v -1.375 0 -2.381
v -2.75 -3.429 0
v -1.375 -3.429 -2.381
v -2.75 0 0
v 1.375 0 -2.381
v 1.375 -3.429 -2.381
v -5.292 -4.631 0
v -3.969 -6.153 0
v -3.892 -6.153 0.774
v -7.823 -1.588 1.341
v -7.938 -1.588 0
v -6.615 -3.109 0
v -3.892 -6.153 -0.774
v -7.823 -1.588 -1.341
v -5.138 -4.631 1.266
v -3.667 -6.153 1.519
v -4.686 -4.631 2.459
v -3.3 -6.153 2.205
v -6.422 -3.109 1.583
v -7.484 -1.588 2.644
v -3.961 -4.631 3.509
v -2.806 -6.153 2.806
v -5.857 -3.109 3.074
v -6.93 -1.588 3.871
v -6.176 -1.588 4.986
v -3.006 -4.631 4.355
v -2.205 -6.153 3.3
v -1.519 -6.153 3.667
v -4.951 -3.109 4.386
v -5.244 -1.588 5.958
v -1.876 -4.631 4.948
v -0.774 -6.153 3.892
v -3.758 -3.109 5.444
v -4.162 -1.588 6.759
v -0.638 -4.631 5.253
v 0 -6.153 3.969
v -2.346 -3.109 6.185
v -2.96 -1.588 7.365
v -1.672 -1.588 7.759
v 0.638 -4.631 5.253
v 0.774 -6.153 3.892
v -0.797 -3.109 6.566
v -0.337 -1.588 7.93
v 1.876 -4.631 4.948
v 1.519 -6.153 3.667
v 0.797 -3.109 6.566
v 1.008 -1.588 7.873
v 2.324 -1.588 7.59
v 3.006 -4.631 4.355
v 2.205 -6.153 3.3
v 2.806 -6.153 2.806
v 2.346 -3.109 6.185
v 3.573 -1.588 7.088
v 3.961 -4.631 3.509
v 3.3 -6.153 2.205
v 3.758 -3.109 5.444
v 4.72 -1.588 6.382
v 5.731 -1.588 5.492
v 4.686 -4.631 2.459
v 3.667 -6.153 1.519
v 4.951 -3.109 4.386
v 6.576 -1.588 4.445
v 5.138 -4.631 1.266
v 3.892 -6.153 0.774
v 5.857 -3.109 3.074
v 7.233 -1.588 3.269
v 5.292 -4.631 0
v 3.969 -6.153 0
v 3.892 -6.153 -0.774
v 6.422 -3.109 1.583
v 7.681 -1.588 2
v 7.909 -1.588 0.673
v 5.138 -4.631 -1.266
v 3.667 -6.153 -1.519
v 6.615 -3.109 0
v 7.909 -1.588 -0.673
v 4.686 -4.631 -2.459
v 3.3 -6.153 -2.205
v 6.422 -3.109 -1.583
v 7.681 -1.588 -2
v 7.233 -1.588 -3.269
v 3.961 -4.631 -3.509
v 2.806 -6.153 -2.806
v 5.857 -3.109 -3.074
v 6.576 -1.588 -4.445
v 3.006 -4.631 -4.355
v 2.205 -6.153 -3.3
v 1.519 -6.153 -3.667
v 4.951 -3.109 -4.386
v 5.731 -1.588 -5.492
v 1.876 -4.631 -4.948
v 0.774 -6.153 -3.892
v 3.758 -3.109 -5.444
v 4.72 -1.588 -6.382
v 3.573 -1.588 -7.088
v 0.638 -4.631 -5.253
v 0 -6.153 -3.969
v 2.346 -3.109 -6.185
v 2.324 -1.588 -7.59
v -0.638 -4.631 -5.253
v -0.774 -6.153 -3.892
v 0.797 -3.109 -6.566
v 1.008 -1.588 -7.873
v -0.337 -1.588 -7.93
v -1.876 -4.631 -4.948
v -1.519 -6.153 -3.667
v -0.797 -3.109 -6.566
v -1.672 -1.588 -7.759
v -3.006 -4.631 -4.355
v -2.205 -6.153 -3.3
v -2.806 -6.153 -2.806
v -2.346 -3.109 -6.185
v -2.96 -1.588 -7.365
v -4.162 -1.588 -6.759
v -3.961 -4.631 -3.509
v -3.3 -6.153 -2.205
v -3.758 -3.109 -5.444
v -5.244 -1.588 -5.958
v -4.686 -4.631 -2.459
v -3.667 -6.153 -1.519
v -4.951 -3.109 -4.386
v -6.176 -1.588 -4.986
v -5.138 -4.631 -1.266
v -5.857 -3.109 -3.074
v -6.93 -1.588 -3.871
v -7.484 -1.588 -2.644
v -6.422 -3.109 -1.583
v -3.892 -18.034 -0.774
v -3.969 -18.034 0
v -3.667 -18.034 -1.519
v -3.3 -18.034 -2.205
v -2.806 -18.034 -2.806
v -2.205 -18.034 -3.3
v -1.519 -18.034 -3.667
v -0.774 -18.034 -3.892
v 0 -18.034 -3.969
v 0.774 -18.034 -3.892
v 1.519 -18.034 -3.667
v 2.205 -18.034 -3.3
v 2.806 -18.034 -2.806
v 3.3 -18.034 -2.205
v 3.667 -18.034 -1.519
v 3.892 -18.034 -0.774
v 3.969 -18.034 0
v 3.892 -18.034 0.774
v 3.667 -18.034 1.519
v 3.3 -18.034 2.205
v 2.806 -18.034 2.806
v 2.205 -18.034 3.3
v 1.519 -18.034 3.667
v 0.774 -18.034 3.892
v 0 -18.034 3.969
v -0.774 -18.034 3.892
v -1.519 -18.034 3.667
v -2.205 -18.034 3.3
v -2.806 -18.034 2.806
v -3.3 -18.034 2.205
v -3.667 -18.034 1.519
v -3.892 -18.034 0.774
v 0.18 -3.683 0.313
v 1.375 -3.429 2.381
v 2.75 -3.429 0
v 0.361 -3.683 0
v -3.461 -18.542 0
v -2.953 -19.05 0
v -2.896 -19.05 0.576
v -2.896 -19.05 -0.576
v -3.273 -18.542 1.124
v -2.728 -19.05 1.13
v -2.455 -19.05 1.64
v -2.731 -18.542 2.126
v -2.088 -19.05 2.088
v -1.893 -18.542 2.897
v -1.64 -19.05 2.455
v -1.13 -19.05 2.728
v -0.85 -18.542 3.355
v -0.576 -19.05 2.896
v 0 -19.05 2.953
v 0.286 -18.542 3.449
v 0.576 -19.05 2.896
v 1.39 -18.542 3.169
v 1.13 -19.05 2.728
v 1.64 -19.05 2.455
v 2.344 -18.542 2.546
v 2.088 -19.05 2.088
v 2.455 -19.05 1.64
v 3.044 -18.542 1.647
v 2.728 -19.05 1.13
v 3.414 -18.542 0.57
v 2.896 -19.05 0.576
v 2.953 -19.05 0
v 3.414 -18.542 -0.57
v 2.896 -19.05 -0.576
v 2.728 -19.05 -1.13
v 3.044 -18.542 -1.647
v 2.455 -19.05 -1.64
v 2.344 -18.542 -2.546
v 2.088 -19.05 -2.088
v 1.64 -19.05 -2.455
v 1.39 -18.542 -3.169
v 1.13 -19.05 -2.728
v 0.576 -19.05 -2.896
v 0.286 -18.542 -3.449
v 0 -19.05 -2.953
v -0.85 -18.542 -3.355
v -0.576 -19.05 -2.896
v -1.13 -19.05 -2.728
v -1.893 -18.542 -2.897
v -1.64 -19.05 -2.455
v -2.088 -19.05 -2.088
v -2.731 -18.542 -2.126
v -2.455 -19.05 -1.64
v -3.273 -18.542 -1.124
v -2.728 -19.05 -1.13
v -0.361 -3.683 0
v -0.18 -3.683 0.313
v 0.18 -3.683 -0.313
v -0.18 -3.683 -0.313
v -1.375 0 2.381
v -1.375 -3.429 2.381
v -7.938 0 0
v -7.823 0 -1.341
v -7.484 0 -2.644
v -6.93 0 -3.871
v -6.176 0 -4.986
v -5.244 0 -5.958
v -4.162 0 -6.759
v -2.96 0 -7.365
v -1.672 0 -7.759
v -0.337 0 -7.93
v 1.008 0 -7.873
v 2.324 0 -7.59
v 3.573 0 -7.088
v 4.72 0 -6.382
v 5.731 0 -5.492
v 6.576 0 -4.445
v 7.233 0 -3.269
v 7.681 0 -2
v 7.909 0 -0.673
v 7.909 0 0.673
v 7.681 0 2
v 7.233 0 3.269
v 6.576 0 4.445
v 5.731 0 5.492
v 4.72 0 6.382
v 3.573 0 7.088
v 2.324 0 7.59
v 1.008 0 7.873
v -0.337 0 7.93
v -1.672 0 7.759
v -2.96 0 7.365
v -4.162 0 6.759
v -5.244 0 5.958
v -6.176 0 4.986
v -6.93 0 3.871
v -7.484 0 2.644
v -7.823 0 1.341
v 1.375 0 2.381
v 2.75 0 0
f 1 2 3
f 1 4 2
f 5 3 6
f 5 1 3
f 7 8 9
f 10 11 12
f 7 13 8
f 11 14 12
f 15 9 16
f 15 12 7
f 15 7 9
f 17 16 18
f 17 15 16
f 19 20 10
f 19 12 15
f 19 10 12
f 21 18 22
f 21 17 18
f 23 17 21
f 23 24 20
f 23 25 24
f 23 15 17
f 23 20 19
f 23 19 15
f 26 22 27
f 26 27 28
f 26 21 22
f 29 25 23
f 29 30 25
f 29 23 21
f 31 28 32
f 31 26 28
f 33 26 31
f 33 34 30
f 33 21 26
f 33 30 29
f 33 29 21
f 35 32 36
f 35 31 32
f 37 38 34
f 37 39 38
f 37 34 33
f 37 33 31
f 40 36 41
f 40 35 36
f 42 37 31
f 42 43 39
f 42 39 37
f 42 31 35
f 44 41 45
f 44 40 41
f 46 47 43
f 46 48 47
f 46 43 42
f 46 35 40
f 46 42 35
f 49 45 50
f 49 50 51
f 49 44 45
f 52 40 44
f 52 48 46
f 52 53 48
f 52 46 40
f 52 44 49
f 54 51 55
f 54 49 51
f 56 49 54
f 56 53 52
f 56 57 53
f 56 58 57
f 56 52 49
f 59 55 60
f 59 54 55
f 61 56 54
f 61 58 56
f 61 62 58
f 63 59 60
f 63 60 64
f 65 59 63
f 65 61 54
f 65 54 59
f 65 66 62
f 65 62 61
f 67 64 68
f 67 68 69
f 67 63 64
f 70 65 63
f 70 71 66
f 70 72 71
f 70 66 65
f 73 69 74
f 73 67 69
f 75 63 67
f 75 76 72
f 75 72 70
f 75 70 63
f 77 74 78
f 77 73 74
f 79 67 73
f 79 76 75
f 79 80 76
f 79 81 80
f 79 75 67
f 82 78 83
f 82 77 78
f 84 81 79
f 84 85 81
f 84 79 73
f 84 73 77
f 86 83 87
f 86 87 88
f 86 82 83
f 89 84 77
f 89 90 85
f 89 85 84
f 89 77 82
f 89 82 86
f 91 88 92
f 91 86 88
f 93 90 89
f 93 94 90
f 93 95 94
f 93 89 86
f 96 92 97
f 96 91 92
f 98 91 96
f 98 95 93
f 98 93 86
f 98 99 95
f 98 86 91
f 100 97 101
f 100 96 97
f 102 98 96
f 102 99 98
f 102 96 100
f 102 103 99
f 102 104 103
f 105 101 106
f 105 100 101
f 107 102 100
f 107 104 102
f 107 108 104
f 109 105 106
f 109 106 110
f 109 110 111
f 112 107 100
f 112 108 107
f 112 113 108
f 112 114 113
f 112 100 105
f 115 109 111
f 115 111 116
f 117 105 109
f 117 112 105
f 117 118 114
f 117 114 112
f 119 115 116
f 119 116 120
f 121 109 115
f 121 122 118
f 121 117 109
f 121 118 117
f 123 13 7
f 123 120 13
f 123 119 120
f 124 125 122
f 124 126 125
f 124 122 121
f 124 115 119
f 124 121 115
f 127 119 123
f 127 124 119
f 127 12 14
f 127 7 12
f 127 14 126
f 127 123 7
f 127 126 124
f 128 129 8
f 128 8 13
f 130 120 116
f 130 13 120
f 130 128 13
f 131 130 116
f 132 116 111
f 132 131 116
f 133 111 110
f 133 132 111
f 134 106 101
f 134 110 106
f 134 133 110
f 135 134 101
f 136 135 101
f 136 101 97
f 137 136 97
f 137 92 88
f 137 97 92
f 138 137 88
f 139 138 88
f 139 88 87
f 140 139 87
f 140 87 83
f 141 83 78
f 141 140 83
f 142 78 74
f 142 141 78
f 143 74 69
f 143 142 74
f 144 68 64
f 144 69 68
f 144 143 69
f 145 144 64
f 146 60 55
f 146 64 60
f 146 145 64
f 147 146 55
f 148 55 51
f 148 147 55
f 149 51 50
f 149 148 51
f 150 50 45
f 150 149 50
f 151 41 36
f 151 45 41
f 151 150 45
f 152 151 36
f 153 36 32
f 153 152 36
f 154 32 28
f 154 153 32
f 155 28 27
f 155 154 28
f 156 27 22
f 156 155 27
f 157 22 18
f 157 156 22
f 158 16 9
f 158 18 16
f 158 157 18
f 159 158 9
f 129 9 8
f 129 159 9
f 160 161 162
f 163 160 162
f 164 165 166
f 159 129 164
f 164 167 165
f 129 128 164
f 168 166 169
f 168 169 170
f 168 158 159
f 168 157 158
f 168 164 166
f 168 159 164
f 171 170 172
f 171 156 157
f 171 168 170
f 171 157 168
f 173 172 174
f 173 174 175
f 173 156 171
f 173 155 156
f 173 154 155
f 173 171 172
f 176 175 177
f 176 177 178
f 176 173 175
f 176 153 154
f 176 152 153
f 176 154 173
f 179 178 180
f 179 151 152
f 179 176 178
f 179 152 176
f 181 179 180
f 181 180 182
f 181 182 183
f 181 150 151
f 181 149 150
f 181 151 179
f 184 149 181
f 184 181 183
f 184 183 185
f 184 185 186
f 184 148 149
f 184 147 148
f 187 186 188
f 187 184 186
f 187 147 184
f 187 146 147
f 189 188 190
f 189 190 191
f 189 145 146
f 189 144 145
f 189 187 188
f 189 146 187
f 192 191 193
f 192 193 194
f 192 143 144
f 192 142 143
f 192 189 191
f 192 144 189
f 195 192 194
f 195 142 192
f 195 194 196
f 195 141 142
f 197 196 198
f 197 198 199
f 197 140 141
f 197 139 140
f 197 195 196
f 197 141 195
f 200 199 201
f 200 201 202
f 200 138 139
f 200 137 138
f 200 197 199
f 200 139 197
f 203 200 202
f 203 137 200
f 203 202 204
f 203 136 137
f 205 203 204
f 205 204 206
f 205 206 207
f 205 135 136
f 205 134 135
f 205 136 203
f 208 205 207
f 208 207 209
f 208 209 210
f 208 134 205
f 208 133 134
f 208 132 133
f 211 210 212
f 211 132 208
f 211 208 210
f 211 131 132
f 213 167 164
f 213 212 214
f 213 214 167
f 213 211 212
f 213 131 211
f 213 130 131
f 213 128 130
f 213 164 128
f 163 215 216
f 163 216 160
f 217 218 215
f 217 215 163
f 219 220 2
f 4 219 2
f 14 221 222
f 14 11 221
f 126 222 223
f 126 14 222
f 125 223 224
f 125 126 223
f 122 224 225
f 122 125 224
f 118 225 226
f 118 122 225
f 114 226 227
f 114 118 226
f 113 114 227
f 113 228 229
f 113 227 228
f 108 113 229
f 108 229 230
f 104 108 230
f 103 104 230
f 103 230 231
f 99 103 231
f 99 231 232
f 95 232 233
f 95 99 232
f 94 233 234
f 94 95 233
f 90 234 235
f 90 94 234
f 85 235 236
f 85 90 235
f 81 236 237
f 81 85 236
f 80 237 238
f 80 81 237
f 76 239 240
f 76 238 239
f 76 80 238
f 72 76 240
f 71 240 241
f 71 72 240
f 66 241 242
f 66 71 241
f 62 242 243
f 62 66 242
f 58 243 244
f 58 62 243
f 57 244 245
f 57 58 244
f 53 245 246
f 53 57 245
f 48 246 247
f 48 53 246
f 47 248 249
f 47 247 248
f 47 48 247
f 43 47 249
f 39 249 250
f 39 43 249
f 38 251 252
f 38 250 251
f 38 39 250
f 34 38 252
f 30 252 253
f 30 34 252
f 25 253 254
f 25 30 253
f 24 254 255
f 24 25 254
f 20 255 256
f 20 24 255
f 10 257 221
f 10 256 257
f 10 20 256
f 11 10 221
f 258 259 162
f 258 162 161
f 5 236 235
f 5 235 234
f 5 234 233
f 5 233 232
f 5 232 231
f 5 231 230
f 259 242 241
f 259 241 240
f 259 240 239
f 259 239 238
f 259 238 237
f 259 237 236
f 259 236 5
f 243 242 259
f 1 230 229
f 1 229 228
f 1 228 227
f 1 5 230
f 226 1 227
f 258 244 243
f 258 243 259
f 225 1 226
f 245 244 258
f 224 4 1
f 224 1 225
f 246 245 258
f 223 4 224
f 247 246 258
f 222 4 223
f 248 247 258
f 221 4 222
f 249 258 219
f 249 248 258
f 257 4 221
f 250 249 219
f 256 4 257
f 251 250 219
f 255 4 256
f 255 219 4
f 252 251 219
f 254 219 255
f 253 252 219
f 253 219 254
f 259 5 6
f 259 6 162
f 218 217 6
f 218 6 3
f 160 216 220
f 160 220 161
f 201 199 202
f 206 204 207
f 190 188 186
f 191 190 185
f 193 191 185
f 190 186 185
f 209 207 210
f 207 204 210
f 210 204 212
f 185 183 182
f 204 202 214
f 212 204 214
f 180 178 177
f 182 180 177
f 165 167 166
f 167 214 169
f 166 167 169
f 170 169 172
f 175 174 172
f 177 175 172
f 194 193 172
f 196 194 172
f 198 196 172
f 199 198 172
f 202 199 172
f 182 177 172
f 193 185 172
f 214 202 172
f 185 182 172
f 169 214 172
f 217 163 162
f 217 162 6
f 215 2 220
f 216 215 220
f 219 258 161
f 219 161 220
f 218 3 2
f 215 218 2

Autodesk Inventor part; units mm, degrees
ref_plane "YZ Plane" through (0, 0, 0) normal (1, 0, 0) x (0, 1, 0)
ref_plane "XZ Plane" through (0, 0, 0) normal (0, 1, 0) x (-1, 0, 0)
ref_plane "XY Plane" through (0, 0, 0) normal (0, 0, 1) x (1, 0, 0)
sketch "Sketch1" plane through (0, 0, 0) normal (0, 0, 1) x (1, 0, 0)
  line L0 (0, 0) -> (-7.9375, 0)
  line L1 (-7.9375, 0) -> (-7.9375, -1.5875)
  line L2 (-7.9375, -1.5875) -> (-3.9687, -6.153)
  line L3 (-3.9687, -6.153) -> (-3.9687, -19.05)
  line L4 (-3.9687, -19.05) -> (0, -19.05)
  line L5 (0, -19.05) -> (0, 0)
  dimension "d0" = 15.875
  dimension "d1" = 1.5875
  dimension "d2" = 19.05
  dimension "d3" = 7.9375
  dimension "d16" = 41
revolve "Revolution1" add sketch "Sketch1" angle 360 about axis through (0, -19.05, 0) along (0, 1, 0)
chamfer "Chamfer1" distance 1.016 angle 45 1 edges at (3.9688, -19.05, 0)
thread "Thread1" size "5/16-18 UNC" class "2A" standard "ANSI Unified Screw Threads" full length
sketch "Sketch2" plane through (0, 0, 0) normal (0, 1, 0) x (1, 0, 0)
  circle A0 centre (0, 0) radius 7.9375 projected
  line L0 (-1.3748, -2.3812) -> (-2.7496, 0)
  line L1 (-2.7496, 0) -> (-1.3748, 2.3813)
  line L2 (-1.3748, 2.3813) -> (1.3748, 2.3813)
  line L3 (1.3748, 2.3813) -> (2.7496, 0)
  line L4 (2.7496, 0) -> (1.3748, -2.3813)
  line L5 (1.3748, -2.3813) -> (-1.3748, -2.3812)
  dimension "d11" = 4.7625
extrude "Extrusion1" cut sketch "Sketch2" against normal blind 3.429 contours L0 L1 L2 L3 L4 L5
sketch "Sketch3" plane through (0, -3.429, 0) normal (0, 1, 0) x (1, 0, 0)
  line L0 (-1.3748, -2.3812) -> (1.3748, -2.3813) projected
  line L1 (1.3748, -2.3813) -> (2.7496, 0) projected
  line L2 (2.7496, 0) -> (1.3748, 2.3813) projected
  line L3 (1.3748, 2.3813) -> (-1.3748, 2.3813) projected
  line L4 (-1.3748, 2.3813) -> (-2.7496, 0) projected
  line L5 (-2.7496, 0) -> (-1.3748, -2.3812) projected
  point P0 (0, 0)
extrude "Extrusion2" cut sketch "Sketch3" against normal blind 0.254 draft -83
